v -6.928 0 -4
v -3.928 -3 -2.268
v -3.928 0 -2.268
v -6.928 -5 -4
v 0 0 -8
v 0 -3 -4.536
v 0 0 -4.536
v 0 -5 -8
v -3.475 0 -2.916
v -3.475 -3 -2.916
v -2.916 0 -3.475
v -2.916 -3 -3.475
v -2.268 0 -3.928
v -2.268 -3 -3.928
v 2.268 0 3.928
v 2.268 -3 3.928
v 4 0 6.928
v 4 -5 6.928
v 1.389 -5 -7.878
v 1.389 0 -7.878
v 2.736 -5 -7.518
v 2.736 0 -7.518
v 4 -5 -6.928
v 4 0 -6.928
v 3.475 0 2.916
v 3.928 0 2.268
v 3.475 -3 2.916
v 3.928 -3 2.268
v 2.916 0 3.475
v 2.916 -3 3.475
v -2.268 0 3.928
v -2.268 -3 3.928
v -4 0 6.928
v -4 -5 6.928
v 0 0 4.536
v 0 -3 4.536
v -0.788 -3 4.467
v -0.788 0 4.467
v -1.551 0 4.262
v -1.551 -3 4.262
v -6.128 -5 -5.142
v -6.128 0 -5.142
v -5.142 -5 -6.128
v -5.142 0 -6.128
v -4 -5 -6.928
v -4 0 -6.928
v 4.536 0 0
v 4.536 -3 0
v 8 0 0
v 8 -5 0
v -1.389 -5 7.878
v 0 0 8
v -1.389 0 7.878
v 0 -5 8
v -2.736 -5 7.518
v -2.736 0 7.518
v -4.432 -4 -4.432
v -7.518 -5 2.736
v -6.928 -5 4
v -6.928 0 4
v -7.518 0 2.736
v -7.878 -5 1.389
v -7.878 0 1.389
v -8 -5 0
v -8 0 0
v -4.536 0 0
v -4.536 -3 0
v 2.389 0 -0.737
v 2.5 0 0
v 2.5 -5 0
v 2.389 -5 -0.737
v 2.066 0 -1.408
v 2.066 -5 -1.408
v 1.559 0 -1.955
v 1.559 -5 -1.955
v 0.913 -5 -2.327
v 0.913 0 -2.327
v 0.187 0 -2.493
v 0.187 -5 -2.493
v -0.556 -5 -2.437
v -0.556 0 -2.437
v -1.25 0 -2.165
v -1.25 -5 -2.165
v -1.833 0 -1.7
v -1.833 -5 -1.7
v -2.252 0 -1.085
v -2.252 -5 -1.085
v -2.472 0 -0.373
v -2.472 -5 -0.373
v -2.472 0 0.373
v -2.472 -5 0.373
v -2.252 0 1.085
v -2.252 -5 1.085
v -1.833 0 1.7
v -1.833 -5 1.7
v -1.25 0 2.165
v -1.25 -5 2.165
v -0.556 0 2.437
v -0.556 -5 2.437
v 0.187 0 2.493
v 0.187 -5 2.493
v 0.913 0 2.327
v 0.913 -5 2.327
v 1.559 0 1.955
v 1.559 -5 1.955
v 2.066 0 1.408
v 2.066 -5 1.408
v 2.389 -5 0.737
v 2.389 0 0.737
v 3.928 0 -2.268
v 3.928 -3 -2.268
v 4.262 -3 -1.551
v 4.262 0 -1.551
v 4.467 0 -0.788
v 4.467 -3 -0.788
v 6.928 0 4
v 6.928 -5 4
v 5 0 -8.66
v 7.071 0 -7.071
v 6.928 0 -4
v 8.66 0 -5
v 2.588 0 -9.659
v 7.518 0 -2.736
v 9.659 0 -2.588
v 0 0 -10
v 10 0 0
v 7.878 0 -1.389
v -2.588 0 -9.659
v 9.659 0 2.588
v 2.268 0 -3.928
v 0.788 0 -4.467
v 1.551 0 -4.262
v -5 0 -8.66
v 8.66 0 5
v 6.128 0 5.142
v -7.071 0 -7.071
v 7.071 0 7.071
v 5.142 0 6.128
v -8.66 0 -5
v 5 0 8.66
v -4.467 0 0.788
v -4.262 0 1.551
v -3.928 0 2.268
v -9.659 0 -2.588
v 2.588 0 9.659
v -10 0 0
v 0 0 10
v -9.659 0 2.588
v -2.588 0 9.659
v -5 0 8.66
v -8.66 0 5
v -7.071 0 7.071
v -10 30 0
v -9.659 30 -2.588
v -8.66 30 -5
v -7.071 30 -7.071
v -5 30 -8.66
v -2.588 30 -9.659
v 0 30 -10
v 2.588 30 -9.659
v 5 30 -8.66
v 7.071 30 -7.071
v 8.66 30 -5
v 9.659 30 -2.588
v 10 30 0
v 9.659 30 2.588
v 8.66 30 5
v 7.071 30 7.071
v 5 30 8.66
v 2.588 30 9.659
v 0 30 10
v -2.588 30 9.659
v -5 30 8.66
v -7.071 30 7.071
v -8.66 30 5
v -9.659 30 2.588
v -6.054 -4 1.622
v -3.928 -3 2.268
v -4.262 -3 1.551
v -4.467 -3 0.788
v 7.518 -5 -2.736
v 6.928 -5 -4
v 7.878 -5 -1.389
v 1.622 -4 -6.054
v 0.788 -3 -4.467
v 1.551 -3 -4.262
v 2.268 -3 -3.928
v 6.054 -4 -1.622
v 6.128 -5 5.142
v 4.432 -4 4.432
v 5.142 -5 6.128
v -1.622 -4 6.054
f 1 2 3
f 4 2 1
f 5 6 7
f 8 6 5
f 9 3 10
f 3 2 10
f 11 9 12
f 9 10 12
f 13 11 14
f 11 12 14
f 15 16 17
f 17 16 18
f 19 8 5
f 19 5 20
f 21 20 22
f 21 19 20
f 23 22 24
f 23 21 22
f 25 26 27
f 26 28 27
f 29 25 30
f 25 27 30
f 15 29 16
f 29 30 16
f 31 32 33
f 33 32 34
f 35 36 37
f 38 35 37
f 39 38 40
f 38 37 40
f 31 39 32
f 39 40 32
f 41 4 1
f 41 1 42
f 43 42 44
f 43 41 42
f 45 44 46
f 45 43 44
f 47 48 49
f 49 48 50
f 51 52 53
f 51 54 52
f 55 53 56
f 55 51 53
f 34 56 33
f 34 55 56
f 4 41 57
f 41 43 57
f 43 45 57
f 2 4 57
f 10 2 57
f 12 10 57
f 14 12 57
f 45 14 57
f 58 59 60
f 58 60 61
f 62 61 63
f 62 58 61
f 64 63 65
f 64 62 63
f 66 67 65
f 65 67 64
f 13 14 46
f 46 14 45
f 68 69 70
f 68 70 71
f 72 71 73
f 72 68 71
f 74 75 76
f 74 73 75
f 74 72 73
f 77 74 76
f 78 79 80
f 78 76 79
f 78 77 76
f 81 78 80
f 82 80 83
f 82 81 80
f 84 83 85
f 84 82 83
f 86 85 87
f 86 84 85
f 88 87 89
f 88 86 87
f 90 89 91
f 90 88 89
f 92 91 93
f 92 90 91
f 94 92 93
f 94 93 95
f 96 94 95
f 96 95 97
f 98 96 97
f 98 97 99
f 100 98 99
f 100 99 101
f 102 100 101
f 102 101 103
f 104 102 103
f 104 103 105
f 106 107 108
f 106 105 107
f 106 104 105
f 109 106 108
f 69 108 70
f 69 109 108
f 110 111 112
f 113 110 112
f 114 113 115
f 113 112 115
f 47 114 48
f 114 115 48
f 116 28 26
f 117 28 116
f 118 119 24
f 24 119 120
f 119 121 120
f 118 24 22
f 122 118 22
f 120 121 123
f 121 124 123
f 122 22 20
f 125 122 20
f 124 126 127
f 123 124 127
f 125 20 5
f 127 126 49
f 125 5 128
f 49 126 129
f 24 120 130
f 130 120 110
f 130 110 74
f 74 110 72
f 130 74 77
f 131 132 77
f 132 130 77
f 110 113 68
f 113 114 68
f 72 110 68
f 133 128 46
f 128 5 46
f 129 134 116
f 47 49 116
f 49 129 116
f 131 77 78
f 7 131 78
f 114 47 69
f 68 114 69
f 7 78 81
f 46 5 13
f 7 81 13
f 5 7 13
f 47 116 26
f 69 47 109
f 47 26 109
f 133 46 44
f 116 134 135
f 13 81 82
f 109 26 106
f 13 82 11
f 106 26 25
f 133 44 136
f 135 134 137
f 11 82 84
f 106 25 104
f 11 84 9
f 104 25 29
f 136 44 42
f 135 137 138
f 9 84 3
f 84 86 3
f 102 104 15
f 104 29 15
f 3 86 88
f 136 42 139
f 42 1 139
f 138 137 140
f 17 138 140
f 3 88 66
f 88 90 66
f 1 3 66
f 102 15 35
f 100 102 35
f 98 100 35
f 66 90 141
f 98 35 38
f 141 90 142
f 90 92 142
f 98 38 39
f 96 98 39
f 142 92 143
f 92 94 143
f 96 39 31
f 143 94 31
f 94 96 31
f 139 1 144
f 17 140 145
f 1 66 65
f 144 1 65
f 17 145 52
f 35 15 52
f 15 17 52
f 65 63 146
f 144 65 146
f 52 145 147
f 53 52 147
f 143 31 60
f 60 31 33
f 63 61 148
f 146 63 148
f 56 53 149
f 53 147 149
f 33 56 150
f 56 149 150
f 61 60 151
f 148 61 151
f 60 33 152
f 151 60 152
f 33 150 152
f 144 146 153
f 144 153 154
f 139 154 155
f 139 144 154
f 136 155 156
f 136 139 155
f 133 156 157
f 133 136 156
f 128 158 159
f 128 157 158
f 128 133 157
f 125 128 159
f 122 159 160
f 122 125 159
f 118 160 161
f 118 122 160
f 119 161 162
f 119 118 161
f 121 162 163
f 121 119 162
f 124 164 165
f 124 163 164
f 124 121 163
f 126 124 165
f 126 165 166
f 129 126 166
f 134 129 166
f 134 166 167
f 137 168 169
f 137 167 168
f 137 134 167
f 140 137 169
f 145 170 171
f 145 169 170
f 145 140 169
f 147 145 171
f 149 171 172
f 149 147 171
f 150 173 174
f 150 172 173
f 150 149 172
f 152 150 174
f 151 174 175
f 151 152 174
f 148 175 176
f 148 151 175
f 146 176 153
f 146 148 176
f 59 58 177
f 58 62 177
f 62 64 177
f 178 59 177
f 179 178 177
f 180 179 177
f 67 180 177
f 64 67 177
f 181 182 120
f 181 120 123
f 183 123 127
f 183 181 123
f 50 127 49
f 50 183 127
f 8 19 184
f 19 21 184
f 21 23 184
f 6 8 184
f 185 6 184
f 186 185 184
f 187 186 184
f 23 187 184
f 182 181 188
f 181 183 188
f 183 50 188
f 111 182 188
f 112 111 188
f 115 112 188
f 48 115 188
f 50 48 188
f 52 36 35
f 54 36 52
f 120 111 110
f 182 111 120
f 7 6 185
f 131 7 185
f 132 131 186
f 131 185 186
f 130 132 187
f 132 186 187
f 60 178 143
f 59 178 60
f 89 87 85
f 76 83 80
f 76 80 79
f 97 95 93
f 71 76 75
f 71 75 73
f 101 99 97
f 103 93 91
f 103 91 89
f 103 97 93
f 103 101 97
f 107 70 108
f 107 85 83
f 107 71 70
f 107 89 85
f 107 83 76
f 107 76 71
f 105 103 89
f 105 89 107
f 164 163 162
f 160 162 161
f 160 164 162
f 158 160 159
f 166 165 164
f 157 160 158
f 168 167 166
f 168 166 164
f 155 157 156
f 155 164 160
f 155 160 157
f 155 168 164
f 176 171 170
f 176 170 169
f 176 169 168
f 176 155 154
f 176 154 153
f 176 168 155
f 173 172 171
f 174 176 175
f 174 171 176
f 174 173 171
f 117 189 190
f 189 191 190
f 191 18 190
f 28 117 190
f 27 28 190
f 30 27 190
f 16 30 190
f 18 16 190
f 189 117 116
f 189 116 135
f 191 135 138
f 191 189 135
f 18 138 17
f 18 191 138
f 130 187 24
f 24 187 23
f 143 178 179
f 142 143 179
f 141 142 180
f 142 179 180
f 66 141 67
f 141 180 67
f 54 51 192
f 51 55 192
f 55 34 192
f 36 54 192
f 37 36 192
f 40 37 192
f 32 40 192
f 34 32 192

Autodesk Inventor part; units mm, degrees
ref_plane "XZ Plane" through (0, 0, 0) normal (0, 1, 0) x (-1, 0, 0)
sketch "Sketch1" plane through (0, 0, 0) normal (0, 1, 0) x (-1, 0, 0)
  circle A0 centre (0, 0) radius 10
  dimension "d0" = 20
extrude "Extrusion1" add sketch "Sketch1" along normal blind 30
sketch "Sketch2" plane through (0, 0, 0) normal (0, -1, 0) x (1, 0, 0)
  circle A0 centre (0, 0) radius 2.5
  dimension "d3" = 5
extrude "Extrusion2" add sketch "Sketch2" along normal blind 5
sketch "Sketch3" plane through (0, -5, 0) normal (0, -1, 0) x (1, 0, 0)
  circle A0 centre (0, 0) radius 2.5 projected
  circle A1 centre (0, 0) radius 4.536
  circle A2 centre (0, 0) radius 8
  line L0 (0, -4.536) -> (0, -8)
  line L1 (0, 0) -> (4, -6.9282)
  line L2 (0, 0) -> (8, 0) construction
  point P0 (2.268, -3.9283)
  dimension "d6" = 9.072
  dimension "d7" = 16
  dimension "d8" = 60
extrude "Extrusion3" add sketch "Sketch3" against normal blind 5 contours L1 A2 L0 A1 picked at (1.6377, -6.621)
pattern_circular "Circular Pattern1" count 6 over 360 about axis through (0, 0, 0) along (0, -1, 0) of "Extrusion3"
ref_plane "Work Plane1" through (0, -5, 8) normal (1, 0, 0) x (0, 0, -1)
sketch "Sketch4" plane through (0, -5, 8) normal (1, 0, 0) x (0, 0, -1)
  line L0 (0, 0) -> (1.0718, 0) projected
  line L1 (0, 0) -> (3.4641, 2)
  line L2 (0, 0) -> (4, 0) construction
  line L3 (0, 0) -> (3.4641, 0)
  line L4 (3.4641, 2) -> (3.4641, 0)
  line L5 (5.732, 0) -> (5.732, 5) projected
  line L6 (8, -7) -> (8, 42) projected
  point P0 (8, 5)
  dimension "d15" = 4
  dimension "d16" = 30
revolve "Revolution1" cut sketch "Sketch4" angle 360 about axis through (0, -10, 0) along (0, -1, 0)
ref_plane "Work Plane2" through (10, 0, 0) normal (1, 0, 0) x (0, 1, 0)
properties part number "pot gövde"
